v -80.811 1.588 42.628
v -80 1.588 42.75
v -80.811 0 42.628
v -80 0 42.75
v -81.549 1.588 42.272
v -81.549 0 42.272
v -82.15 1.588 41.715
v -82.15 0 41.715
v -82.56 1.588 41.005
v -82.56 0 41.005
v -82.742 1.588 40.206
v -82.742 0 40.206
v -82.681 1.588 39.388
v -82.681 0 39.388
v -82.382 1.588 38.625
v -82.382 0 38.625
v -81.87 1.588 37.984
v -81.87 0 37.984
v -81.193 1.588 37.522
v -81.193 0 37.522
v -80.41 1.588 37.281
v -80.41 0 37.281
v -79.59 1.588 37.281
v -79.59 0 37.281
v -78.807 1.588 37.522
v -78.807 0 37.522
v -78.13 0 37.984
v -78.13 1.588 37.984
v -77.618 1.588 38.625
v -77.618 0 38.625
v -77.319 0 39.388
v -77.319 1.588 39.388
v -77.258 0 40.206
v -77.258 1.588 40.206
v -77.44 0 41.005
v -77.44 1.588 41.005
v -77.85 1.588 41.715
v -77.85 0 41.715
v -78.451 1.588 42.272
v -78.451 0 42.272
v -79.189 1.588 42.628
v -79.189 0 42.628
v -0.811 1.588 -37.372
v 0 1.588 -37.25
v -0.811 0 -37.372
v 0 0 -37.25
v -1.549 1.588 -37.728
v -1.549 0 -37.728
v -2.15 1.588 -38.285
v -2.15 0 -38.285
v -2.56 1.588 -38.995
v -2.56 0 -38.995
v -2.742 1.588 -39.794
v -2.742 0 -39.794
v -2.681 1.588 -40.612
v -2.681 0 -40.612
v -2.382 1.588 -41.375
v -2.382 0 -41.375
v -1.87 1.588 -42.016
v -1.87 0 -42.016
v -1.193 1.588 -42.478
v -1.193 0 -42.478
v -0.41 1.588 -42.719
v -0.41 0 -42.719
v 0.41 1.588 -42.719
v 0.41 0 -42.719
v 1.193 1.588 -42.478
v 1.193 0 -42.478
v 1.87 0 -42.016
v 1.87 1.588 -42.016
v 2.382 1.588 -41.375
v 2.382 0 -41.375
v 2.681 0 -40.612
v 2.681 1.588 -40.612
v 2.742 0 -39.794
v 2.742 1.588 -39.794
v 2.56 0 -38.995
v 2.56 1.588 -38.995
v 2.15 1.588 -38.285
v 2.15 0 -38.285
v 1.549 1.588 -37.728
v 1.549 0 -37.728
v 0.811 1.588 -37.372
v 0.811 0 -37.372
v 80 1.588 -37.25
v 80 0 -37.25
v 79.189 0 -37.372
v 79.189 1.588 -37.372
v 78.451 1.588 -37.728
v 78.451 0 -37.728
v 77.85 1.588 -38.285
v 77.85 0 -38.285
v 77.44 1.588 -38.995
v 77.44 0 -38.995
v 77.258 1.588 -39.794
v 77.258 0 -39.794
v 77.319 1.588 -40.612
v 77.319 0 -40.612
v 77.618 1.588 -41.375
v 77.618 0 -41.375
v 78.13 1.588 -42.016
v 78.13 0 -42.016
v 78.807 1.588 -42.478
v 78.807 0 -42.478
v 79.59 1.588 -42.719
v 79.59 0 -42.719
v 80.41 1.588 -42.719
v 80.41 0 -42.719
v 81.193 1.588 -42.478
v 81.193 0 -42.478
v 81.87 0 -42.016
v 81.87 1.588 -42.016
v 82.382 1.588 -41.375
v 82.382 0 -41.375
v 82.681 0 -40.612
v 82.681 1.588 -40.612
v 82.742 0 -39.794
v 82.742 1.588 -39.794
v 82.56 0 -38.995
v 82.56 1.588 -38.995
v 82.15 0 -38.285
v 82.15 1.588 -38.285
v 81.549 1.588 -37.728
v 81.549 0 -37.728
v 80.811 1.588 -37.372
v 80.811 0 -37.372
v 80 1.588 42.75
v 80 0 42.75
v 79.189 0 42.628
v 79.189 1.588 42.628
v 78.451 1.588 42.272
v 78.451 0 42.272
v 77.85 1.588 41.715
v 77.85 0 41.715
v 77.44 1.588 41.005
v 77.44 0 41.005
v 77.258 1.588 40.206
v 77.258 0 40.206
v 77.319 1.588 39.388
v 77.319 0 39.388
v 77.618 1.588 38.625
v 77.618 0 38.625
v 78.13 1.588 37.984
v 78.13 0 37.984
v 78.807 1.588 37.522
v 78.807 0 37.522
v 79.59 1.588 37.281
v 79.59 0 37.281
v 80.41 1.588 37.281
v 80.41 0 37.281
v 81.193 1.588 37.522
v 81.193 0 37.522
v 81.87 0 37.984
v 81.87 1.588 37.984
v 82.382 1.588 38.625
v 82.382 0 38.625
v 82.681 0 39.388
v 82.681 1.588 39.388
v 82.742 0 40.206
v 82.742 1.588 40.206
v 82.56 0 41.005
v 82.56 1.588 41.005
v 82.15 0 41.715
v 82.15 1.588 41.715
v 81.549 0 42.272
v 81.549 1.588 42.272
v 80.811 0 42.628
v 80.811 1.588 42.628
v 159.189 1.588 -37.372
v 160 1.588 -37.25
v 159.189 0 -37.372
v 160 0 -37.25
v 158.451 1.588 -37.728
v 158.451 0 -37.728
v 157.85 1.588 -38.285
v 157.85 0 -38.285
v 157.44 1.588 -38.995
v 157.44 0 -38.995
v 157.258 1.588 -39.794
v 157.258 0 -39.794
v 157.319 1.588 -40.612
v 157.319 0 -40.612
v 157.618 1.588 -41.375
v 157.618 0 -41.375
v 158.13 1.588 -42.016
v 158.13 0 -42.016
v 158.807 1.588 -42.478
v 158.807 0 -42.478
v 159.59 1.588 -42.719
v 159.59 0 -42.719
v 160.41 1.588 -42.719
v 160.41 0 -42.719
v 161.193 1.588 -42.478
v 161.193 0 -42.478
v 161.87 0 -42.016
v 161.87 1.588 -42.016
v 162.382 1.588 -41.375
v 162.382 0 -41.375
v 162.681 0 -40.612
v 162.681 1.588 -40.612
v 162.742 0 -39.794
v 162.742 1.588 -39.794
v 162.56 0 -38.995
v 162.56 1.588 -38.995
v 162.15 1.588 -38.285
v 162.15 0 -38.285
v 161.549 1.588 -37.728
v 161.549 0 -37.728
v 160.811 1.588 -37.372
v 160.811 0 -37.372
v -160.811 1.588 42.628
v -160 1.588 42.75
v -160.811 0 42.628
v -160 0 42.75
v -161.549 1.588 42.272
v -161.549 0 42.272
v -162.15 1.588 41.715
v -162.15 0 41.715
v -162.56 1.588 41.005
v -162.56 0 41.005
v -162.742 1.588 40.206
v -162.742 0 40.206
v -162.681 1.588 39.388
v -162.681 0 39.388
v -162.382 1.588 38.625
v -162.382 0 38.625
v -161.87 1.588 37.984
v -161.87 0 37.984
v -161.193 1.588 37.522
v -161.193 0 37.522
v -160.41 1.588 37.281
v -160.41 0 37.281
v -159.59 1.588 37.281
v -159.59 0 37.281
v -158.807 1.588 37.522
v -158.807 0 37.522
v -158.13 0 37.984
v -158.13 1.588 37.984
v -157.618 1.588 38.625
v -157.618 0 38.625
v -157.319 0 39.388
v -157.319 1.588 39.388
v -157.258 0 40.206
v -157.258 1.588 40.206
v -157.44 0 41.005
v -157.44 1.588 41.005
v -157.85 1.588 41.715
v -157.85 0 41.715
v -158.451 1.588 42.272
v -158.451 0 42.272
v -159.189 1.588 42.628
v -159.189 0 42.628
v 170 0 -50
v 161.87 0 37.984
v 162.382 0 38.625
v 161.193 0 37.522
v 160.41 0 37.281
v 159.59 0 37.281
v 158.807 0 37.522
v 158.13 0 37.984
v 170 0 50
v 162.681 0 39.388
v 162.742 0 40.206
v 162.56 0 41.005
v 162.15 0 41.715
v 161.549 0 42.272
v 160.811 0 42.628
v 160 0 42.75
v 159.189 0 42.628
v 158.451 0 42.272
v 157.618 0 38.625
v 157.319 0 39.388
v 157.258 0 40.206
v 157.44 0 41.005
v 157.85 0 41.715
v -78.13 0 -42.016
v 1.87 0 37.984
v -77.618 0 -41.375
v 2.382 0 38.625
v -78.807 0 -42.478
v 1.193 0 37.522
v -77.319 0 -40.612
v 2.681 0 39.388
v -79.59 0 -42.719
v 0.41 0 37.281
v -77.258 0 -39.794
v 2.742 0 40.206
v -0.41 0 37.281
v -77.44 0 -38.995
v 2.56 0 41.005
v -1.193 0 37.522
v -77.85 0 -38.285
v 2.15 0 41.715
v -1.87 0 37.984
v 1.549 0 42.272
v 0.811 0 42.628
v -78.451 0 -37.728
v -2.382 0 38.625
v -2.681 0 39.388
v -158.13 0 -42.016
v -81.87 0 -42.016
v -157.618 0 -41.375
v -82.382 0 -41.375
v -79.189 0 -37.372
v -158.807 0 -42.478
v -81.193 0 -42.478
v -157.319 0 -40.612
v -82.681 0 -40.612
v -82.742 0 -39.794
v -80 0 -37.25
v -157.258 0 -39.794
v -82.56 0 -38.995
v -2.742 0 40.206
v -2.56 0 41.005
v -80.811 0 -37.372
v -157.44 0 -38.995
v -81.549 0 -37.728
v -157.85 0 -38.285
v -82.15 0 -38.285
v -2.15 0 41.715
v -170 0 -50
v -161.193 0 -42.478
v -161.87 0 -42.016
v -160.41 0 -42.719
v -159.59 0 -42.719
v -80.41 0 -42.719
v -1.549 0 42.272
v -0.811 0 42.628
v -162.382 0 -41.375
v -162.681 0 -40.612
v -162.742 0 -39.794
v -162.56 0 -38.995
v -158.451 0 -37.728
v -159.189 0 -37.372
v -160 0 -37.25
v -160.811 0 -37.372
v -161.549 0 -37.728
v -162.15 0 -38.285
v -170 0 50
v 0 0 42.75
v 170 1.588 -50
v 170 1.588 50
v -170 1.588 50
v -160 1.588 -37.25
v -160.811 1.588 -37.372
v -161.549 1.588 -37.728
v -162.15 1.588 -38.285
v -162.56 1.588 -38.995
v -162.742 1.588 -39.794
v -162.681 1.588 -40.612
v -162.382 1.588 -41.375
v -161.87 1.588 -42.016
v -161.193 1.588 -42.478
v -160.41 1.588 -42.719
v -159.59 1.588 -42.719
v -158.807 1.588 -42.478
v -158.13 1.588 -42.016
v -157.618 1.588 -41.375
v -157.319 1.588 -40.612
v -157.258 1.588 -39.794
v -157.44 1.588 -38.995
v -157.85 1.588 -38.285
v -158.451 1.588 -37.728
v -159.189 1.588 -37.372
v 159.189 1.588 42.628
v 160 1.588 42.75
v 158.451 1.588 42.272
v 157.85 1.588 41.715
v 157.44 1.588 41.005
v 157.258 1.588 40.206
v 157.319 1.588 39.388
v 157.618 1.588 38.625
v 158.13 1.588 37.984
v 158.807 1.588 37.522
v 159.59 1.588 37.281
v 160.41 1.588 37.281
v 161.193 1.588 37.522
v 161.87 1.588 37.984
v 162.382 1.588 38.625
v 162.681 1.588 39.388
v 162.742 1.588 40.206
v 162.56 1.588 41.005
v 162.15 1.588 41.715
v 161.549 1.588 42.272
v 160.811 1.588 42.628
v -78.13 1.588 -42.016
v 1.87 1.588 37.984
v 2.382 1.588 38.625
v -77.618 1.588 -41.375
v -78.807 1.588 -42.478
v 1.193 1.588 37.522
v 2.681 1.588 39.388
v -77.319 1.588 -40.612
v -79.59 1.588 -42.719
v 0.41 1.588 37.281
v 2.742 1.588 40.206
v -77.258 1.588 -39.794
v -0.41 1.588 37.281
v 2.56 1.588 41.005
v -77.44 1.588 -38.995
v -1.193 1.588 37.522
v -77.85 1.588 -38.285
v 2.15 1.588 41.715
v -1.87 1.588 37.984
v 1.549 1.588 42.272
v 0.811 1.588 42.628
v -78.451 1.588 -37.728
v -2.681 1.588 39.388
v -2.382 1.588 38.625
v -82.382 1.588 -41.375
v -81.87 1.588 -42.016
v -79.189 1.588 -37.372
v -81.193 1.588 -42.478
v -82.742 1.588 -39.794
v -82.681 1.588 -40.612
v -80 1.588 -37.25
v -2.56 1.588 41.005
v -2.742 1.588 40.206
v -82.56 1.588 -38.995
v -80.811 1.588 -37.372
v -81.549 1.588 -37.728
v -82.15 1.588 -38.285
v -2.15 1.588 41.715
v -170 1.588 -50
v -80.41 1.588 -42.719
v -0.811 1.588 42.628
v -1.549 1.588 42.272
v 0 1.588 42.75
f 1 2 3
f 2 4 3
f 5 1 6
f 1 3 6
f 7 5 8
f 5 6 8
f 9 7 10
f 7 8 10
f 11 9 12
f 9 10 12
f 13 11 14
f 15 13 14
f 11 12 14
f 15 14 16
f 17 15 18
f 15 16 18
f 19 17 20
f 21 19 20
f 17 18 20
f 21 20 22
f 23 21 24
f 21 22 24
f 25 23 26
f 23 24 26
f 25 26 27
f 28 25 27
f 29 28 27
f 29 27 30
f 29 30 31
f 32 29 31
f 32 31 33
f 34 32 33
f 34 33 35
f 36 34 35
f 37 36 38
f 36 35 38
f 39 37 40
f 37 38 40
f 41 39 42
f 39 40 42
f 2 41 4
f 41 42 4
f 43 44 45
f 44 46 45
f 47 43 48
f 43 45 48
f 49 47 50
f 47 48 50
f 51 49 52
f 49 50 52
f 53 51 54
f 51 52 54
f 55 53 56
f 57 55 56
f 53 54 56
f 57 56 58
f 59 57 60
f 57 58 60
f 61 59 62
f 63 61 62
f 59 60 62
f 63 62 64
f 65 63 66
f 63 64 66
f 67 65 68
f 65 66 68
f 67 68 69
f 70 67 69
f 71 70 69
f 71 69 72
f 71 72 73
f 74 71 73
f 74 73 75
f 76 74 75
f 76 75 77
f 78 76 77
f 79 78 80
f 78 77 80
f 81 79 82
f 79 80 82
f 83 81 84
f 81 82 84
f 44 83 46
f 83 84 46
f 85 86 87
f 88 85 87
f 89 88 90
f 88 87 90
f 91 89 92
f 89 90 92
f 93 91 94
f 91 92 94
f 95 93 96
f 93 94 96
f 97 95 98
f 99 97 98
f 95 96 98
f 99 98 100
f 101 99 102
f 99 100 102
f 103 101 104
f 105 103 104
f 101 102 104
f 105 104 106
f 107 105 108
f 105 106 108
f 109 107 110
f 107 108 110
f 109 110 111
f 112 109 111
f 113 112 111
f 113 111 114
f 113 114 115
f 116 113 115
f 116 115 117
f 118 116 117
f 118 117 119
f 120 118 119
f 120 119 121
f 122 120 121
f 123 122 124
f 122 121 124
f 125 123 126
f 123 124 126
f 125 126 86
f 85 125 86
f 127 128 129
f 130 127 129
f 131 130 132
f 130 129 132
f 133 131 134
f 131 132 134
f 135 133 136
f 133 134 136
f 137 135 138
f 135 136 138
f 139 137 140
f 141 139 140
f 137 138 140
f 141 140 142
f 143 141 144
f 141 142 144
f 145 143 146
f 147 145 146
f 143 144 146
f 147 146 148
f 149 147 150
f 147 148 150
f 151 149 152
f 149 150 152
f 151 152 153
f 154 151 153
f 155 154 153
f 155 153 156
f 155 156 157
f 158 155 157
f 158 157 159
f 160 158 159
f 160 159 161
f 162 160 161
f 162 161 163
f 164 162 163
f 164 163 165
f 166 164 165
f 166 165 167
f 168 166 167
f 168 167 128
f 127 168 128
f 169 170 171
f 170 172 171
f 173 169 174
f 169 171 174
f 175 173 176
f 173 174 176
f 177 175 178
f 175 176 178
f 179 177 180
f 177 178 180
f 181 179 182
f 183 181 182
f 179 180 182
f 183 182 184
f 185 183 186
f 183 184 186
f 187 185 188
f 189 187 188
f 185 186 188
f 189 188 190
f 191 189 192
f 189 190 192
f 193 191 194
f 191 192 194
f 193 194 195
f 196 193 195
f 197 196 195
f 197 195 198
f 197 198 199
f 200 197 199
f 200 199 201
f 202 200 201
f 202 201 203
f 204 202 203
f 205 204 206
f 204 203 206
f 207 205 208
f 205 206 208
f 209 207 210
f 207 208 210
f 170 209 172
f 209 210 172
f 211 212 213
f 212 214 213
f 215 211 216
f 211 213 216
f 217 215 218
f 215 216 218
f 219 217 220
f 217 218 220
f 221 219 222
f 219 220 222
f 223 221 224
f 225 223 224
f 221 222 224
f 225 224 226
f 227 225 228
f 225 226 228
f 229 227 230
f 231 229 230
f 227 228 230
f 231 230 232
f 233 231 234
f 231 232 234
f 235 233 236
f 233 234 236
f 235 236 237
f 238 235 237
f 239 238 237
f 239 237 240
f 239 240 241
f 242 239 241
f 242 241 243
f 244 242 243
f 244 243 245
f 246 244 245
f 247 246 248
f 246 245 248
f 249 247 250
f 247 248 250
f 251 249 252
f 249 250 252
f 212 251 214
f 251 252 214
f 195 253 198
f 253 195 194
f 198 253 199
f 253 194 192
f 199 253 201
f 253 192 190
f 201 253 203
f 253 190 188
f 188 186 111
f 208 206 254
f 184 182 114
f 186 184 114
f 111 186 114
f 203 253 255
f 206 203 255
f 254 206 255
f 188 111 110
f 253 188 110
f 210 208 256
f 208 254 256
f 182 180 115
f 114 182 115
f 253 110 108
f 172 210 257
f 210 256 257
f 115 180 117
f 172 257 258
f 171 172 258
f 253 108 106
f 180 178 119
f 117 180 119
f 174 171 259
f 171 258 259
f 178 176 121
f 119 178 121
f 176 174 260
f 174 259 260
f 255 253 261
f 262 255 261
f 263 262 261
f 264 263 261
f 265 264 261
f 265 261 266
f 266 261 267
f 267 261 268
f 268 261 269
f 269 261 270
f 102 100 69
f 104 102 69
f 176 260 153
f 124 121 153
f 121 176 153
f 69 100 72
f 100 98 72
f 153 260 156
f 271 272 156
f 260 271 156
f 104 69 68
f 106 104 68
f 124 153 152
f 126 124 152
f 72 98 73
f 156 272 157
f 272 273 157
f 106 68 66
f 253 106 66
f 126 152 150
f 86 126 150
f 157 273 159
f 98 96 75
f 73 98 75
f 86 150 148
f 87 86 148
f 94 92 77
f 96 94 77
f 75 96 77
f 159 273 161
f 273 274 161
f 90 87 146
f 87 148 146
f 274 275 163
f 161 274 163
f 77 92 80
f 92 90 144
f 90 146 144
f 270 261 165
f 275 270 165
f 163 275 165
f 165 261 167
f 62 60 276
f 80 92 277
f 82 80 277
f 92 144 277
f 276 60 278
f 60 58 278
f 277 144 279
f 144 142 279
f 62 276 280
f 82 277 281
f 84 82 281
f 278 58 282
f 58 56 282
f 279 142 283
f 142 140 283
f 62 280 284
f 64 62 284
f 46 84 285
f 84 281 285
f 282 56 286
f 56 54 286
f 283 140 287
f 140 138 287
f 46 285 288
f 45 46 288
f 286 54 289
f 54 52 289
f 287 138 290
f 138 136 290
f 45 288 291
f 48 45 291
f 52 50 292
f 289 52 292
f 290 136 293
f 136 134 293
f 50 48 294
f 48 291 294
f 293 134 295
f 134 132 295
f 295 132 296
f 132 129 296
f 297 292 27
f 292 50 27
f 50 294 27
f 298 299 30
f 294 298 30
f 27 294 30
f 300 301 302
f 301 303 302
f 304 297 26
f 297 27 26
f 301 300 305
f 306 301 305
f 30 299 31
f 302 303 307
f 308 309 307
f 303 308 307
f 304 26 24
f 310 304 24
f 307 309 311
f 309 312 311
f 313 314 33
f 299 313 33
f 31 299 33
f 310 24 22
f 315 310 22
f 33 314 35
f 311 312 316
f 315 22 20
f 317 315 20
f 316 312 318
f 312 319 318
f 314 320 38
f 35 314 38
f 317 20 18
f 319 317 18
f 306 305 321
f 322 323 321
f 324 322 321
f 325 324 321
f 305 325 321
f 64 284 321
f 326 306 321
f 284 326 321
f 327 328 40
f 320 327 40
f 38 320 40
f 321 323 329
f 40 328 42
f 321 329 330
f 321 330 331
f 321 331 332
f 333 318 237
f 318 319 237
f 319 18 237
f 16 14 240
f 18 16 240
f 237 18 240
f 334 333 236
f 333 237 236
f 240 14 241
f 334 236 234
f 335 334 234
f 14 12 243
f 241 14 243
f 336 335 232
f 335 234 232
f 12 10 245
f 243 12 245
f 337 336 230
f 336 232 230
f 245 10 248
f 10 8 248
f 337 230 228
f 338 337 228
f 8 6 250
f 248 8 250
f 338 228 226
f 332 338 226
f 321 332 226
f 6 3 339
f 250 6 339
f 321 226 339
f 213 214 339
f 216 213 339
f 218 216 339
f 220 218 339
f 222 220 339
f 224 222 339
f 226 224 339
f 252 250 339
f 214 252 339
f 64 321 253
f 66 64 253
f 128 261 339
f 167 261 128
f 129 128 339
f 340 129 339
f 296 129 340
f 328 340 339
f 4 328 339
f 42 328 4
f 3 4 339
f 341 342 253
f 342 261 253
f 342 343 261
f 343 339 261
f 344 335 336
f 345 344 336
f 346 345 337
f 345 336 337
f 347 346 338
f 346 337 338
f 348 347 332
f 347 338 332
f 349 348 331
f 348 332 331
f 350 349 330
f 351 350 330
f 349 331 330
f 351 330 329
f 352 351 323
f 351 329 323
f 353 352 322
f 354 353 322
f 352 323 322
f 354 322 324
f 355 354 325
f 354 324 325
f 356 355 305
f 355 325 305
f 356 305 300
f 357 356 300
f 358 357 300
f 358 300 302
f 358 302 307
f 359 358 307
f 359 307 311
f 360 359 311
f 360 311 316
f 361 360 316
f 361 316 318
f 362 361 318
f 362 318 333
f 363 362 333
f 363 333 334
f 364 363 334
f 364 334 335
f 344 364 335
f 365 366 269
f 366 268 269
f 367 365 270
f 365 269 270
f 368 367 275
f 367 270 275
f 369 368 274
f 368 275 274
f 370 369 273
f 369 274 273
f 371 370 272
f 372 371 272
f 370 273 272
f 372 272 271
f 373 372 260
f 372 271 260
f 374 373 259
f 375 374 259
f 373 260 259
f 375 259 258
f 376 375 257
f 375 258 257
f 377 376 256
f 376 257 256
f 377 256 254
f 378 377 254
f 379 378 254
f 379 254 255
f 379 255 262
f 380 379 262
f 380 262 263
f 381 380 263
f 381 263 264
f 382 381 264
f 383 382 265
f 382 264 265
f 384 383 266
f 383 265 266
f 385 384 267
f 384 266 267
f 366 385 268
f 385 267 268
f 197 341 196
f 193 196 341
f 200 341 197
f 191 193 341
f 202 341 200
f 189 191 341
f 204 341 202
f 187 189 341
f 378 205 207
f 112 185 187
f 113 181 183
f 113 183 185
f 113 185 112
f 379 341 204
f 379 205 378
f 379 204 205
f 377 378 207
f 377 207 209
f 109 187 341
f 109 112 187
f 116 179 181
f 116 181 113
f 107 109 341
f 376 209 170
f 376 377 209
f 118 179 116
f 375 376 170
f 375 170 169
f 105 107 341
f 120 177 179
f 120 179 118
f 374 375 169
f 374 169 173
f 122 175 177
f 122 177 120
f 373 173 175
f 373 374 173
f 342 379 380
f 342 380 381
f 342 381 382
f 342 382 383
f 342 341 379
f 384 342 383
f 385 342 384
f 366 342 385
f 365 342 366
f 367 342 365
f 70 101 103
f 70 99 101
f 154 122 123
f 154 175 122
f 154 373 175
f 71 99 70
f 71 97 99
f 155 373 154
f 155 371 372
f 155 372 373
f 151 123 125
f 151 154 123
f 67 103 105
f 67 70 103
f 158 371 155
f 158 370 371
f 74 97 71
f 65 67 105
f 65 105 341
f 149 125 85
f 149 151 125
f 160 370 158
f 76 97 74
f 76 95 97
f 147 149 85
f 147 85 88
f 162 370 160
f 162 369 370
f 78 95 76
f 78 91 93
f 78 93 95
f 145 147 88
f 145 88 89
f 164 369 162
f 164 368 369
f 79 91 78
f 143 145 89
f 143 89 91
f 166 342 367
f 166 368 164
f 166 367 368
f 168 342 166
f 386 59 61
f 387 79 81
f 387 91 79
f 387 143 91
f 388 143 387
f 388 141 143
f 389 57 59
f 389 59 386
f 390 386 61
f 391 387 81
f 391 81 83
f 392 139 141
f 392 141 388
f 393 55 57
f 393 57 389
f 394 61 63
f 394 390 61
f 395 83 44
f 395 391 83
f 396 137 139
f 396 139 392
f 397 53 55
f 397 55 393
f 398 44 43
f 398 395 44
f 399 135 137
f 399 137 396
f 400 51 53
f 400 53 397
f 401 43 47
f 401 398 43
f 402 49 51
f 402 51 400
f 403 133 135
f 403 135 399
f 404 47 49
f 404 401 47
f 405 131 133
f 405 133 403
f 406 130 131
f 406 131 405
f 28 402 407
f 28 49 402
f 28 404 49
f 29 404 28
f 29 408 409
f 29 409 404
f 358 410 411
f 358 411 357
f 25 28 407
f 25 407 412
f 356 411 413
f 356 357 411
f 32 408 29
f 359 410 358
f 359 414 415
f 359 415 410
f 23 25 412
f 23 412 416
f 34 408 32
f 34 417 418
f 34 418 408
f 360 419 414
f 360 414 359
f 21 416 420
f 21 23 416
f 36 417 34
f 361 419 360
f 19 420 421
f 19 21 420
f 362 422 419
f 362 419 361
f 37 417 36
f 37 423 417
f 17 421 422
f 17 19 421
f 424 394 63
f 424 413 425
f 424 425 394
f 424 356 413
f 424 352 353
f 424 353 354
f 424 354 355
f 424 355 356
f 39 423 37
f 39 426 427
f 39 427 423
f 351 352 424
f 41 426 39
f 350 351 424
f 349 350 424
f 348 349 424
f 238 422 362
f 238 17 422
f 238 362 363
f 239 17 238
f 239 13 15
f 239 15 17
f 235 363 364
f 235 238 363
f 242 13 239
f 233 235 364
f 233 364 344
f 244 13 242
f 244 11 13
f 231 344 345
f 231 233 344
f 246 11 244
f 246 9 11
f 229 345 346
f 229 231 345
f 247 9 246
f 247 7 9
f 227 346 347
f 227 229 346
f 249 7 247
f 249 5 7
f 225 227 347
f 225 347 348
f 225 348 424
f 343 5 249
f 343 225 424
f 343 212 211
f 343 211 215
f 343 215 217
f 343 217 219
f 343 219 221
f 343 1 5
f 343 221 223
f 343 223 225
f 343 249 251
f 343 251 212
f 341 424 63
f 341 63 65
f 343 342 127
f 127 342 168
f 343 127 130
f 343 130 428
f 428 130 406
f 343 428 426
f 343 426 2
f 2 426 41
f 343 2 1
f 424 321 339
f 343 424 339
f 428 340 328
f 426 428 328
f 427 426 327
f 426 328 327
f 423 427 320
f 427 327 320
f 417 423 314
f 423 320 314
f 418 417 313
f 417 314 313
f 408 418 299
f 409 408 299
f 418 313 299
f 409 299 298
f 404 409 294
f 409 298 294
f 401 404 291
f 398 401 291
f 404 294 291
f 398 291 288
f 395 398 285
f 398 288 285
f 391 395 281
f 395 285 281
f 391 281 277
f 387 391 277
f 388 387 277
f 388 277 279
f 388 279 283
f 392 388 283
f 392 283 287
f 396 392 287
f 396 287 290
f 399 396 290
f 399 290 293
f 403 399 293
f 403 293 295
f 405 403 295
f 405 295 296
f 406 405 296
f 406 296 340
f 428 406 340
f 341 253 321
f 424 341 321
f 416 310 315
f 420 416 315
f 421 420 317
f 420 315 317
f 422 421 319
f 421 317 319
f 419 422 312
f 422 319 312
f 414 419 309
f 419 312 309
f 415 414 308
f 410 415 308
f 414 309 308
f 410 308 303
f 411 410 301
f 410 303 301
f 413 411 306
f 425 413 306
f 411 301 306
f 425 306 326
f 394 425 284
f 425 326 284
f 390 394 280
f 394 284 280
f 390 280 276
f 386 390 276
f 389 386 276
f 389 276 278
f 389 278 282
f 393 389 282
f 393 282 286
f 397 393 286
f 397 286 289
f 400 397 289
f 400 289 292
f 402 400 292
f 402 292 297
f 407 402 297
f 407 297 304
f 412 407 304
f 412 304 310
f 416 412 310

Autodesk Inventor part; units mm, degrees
ref_plane "YZ Plane" through (0, 0, 0) normal (1, 0, 0) x (0, 1, 0)
ref_plane "XZ Plane" through (0, 0, 0) normal (0, 1, 0) x (-1, 0, 0)
ref_plane "XY Plane" through (0, 0, 0) normal (0, 0, 1) x (1, 0, 0)
sketch "Sketch1" plane through (0, 0, 0) normal (0, 1, 0) x (-1, 0, 0)
  line L0 (170, 50) -> (-170, 50)
  line L1 (-170, 50) -> (-170, -50)
  line L2 (-170, -50) -> (170, -50)
  line L3 (170, -50) -> (170, 50)
  line L4 (170, 50) -> (-170, -50) construction
  line L5 (-170, 50) -> (170, -50) construction
  point P0 (0, 0)
  dimension "d0" = 340
  dimension "d1" = 100
extrude "Extrusion1" add sketch "Sketch1" along normal blind 1.5875
sketch "Sketch2" plane through (0, 1.5875, 0) normal (0, 1, 0) x (1, 0, 0)
  line L0 (-170, -50) -> (170, -50) projected
  line L1 (170, -50) -> (170, 50) projected
  line L2 (170, 50) -> (-170, 50) projected
  line L3 (-170, 50) -> (-170, -50) projected
  point P0 (0, 0)
  point P1 (-160, -40)
  dimension "d4" = 10
  dimension "d5" = 10
hole "Hole1" at (-160, 1.5875, 40) direction (0, -1, 0) diameter 5.5 end through all clearance for "Hex Head Bolt" size "M5" standard "Ansi Metric M Profile"
pattern_linear "Rectangular Pattern1" count 2 spacing 80 along (0, 0, -1) count 5 spacing 80 along (1, 0, 0) of "Hole1"
equation "\"d1\" = depth"
equation "\"d2\" = facingGasketThickness"
equation "\"mppcMountThickness\" = 6.35"
equation "\"depth\" = 100"
equation "\"facingThickness\" = 12.7"
equation "\"facingGasketThickness\" = 1.5875"
properties part number "sideGasket" material "Rubber"
